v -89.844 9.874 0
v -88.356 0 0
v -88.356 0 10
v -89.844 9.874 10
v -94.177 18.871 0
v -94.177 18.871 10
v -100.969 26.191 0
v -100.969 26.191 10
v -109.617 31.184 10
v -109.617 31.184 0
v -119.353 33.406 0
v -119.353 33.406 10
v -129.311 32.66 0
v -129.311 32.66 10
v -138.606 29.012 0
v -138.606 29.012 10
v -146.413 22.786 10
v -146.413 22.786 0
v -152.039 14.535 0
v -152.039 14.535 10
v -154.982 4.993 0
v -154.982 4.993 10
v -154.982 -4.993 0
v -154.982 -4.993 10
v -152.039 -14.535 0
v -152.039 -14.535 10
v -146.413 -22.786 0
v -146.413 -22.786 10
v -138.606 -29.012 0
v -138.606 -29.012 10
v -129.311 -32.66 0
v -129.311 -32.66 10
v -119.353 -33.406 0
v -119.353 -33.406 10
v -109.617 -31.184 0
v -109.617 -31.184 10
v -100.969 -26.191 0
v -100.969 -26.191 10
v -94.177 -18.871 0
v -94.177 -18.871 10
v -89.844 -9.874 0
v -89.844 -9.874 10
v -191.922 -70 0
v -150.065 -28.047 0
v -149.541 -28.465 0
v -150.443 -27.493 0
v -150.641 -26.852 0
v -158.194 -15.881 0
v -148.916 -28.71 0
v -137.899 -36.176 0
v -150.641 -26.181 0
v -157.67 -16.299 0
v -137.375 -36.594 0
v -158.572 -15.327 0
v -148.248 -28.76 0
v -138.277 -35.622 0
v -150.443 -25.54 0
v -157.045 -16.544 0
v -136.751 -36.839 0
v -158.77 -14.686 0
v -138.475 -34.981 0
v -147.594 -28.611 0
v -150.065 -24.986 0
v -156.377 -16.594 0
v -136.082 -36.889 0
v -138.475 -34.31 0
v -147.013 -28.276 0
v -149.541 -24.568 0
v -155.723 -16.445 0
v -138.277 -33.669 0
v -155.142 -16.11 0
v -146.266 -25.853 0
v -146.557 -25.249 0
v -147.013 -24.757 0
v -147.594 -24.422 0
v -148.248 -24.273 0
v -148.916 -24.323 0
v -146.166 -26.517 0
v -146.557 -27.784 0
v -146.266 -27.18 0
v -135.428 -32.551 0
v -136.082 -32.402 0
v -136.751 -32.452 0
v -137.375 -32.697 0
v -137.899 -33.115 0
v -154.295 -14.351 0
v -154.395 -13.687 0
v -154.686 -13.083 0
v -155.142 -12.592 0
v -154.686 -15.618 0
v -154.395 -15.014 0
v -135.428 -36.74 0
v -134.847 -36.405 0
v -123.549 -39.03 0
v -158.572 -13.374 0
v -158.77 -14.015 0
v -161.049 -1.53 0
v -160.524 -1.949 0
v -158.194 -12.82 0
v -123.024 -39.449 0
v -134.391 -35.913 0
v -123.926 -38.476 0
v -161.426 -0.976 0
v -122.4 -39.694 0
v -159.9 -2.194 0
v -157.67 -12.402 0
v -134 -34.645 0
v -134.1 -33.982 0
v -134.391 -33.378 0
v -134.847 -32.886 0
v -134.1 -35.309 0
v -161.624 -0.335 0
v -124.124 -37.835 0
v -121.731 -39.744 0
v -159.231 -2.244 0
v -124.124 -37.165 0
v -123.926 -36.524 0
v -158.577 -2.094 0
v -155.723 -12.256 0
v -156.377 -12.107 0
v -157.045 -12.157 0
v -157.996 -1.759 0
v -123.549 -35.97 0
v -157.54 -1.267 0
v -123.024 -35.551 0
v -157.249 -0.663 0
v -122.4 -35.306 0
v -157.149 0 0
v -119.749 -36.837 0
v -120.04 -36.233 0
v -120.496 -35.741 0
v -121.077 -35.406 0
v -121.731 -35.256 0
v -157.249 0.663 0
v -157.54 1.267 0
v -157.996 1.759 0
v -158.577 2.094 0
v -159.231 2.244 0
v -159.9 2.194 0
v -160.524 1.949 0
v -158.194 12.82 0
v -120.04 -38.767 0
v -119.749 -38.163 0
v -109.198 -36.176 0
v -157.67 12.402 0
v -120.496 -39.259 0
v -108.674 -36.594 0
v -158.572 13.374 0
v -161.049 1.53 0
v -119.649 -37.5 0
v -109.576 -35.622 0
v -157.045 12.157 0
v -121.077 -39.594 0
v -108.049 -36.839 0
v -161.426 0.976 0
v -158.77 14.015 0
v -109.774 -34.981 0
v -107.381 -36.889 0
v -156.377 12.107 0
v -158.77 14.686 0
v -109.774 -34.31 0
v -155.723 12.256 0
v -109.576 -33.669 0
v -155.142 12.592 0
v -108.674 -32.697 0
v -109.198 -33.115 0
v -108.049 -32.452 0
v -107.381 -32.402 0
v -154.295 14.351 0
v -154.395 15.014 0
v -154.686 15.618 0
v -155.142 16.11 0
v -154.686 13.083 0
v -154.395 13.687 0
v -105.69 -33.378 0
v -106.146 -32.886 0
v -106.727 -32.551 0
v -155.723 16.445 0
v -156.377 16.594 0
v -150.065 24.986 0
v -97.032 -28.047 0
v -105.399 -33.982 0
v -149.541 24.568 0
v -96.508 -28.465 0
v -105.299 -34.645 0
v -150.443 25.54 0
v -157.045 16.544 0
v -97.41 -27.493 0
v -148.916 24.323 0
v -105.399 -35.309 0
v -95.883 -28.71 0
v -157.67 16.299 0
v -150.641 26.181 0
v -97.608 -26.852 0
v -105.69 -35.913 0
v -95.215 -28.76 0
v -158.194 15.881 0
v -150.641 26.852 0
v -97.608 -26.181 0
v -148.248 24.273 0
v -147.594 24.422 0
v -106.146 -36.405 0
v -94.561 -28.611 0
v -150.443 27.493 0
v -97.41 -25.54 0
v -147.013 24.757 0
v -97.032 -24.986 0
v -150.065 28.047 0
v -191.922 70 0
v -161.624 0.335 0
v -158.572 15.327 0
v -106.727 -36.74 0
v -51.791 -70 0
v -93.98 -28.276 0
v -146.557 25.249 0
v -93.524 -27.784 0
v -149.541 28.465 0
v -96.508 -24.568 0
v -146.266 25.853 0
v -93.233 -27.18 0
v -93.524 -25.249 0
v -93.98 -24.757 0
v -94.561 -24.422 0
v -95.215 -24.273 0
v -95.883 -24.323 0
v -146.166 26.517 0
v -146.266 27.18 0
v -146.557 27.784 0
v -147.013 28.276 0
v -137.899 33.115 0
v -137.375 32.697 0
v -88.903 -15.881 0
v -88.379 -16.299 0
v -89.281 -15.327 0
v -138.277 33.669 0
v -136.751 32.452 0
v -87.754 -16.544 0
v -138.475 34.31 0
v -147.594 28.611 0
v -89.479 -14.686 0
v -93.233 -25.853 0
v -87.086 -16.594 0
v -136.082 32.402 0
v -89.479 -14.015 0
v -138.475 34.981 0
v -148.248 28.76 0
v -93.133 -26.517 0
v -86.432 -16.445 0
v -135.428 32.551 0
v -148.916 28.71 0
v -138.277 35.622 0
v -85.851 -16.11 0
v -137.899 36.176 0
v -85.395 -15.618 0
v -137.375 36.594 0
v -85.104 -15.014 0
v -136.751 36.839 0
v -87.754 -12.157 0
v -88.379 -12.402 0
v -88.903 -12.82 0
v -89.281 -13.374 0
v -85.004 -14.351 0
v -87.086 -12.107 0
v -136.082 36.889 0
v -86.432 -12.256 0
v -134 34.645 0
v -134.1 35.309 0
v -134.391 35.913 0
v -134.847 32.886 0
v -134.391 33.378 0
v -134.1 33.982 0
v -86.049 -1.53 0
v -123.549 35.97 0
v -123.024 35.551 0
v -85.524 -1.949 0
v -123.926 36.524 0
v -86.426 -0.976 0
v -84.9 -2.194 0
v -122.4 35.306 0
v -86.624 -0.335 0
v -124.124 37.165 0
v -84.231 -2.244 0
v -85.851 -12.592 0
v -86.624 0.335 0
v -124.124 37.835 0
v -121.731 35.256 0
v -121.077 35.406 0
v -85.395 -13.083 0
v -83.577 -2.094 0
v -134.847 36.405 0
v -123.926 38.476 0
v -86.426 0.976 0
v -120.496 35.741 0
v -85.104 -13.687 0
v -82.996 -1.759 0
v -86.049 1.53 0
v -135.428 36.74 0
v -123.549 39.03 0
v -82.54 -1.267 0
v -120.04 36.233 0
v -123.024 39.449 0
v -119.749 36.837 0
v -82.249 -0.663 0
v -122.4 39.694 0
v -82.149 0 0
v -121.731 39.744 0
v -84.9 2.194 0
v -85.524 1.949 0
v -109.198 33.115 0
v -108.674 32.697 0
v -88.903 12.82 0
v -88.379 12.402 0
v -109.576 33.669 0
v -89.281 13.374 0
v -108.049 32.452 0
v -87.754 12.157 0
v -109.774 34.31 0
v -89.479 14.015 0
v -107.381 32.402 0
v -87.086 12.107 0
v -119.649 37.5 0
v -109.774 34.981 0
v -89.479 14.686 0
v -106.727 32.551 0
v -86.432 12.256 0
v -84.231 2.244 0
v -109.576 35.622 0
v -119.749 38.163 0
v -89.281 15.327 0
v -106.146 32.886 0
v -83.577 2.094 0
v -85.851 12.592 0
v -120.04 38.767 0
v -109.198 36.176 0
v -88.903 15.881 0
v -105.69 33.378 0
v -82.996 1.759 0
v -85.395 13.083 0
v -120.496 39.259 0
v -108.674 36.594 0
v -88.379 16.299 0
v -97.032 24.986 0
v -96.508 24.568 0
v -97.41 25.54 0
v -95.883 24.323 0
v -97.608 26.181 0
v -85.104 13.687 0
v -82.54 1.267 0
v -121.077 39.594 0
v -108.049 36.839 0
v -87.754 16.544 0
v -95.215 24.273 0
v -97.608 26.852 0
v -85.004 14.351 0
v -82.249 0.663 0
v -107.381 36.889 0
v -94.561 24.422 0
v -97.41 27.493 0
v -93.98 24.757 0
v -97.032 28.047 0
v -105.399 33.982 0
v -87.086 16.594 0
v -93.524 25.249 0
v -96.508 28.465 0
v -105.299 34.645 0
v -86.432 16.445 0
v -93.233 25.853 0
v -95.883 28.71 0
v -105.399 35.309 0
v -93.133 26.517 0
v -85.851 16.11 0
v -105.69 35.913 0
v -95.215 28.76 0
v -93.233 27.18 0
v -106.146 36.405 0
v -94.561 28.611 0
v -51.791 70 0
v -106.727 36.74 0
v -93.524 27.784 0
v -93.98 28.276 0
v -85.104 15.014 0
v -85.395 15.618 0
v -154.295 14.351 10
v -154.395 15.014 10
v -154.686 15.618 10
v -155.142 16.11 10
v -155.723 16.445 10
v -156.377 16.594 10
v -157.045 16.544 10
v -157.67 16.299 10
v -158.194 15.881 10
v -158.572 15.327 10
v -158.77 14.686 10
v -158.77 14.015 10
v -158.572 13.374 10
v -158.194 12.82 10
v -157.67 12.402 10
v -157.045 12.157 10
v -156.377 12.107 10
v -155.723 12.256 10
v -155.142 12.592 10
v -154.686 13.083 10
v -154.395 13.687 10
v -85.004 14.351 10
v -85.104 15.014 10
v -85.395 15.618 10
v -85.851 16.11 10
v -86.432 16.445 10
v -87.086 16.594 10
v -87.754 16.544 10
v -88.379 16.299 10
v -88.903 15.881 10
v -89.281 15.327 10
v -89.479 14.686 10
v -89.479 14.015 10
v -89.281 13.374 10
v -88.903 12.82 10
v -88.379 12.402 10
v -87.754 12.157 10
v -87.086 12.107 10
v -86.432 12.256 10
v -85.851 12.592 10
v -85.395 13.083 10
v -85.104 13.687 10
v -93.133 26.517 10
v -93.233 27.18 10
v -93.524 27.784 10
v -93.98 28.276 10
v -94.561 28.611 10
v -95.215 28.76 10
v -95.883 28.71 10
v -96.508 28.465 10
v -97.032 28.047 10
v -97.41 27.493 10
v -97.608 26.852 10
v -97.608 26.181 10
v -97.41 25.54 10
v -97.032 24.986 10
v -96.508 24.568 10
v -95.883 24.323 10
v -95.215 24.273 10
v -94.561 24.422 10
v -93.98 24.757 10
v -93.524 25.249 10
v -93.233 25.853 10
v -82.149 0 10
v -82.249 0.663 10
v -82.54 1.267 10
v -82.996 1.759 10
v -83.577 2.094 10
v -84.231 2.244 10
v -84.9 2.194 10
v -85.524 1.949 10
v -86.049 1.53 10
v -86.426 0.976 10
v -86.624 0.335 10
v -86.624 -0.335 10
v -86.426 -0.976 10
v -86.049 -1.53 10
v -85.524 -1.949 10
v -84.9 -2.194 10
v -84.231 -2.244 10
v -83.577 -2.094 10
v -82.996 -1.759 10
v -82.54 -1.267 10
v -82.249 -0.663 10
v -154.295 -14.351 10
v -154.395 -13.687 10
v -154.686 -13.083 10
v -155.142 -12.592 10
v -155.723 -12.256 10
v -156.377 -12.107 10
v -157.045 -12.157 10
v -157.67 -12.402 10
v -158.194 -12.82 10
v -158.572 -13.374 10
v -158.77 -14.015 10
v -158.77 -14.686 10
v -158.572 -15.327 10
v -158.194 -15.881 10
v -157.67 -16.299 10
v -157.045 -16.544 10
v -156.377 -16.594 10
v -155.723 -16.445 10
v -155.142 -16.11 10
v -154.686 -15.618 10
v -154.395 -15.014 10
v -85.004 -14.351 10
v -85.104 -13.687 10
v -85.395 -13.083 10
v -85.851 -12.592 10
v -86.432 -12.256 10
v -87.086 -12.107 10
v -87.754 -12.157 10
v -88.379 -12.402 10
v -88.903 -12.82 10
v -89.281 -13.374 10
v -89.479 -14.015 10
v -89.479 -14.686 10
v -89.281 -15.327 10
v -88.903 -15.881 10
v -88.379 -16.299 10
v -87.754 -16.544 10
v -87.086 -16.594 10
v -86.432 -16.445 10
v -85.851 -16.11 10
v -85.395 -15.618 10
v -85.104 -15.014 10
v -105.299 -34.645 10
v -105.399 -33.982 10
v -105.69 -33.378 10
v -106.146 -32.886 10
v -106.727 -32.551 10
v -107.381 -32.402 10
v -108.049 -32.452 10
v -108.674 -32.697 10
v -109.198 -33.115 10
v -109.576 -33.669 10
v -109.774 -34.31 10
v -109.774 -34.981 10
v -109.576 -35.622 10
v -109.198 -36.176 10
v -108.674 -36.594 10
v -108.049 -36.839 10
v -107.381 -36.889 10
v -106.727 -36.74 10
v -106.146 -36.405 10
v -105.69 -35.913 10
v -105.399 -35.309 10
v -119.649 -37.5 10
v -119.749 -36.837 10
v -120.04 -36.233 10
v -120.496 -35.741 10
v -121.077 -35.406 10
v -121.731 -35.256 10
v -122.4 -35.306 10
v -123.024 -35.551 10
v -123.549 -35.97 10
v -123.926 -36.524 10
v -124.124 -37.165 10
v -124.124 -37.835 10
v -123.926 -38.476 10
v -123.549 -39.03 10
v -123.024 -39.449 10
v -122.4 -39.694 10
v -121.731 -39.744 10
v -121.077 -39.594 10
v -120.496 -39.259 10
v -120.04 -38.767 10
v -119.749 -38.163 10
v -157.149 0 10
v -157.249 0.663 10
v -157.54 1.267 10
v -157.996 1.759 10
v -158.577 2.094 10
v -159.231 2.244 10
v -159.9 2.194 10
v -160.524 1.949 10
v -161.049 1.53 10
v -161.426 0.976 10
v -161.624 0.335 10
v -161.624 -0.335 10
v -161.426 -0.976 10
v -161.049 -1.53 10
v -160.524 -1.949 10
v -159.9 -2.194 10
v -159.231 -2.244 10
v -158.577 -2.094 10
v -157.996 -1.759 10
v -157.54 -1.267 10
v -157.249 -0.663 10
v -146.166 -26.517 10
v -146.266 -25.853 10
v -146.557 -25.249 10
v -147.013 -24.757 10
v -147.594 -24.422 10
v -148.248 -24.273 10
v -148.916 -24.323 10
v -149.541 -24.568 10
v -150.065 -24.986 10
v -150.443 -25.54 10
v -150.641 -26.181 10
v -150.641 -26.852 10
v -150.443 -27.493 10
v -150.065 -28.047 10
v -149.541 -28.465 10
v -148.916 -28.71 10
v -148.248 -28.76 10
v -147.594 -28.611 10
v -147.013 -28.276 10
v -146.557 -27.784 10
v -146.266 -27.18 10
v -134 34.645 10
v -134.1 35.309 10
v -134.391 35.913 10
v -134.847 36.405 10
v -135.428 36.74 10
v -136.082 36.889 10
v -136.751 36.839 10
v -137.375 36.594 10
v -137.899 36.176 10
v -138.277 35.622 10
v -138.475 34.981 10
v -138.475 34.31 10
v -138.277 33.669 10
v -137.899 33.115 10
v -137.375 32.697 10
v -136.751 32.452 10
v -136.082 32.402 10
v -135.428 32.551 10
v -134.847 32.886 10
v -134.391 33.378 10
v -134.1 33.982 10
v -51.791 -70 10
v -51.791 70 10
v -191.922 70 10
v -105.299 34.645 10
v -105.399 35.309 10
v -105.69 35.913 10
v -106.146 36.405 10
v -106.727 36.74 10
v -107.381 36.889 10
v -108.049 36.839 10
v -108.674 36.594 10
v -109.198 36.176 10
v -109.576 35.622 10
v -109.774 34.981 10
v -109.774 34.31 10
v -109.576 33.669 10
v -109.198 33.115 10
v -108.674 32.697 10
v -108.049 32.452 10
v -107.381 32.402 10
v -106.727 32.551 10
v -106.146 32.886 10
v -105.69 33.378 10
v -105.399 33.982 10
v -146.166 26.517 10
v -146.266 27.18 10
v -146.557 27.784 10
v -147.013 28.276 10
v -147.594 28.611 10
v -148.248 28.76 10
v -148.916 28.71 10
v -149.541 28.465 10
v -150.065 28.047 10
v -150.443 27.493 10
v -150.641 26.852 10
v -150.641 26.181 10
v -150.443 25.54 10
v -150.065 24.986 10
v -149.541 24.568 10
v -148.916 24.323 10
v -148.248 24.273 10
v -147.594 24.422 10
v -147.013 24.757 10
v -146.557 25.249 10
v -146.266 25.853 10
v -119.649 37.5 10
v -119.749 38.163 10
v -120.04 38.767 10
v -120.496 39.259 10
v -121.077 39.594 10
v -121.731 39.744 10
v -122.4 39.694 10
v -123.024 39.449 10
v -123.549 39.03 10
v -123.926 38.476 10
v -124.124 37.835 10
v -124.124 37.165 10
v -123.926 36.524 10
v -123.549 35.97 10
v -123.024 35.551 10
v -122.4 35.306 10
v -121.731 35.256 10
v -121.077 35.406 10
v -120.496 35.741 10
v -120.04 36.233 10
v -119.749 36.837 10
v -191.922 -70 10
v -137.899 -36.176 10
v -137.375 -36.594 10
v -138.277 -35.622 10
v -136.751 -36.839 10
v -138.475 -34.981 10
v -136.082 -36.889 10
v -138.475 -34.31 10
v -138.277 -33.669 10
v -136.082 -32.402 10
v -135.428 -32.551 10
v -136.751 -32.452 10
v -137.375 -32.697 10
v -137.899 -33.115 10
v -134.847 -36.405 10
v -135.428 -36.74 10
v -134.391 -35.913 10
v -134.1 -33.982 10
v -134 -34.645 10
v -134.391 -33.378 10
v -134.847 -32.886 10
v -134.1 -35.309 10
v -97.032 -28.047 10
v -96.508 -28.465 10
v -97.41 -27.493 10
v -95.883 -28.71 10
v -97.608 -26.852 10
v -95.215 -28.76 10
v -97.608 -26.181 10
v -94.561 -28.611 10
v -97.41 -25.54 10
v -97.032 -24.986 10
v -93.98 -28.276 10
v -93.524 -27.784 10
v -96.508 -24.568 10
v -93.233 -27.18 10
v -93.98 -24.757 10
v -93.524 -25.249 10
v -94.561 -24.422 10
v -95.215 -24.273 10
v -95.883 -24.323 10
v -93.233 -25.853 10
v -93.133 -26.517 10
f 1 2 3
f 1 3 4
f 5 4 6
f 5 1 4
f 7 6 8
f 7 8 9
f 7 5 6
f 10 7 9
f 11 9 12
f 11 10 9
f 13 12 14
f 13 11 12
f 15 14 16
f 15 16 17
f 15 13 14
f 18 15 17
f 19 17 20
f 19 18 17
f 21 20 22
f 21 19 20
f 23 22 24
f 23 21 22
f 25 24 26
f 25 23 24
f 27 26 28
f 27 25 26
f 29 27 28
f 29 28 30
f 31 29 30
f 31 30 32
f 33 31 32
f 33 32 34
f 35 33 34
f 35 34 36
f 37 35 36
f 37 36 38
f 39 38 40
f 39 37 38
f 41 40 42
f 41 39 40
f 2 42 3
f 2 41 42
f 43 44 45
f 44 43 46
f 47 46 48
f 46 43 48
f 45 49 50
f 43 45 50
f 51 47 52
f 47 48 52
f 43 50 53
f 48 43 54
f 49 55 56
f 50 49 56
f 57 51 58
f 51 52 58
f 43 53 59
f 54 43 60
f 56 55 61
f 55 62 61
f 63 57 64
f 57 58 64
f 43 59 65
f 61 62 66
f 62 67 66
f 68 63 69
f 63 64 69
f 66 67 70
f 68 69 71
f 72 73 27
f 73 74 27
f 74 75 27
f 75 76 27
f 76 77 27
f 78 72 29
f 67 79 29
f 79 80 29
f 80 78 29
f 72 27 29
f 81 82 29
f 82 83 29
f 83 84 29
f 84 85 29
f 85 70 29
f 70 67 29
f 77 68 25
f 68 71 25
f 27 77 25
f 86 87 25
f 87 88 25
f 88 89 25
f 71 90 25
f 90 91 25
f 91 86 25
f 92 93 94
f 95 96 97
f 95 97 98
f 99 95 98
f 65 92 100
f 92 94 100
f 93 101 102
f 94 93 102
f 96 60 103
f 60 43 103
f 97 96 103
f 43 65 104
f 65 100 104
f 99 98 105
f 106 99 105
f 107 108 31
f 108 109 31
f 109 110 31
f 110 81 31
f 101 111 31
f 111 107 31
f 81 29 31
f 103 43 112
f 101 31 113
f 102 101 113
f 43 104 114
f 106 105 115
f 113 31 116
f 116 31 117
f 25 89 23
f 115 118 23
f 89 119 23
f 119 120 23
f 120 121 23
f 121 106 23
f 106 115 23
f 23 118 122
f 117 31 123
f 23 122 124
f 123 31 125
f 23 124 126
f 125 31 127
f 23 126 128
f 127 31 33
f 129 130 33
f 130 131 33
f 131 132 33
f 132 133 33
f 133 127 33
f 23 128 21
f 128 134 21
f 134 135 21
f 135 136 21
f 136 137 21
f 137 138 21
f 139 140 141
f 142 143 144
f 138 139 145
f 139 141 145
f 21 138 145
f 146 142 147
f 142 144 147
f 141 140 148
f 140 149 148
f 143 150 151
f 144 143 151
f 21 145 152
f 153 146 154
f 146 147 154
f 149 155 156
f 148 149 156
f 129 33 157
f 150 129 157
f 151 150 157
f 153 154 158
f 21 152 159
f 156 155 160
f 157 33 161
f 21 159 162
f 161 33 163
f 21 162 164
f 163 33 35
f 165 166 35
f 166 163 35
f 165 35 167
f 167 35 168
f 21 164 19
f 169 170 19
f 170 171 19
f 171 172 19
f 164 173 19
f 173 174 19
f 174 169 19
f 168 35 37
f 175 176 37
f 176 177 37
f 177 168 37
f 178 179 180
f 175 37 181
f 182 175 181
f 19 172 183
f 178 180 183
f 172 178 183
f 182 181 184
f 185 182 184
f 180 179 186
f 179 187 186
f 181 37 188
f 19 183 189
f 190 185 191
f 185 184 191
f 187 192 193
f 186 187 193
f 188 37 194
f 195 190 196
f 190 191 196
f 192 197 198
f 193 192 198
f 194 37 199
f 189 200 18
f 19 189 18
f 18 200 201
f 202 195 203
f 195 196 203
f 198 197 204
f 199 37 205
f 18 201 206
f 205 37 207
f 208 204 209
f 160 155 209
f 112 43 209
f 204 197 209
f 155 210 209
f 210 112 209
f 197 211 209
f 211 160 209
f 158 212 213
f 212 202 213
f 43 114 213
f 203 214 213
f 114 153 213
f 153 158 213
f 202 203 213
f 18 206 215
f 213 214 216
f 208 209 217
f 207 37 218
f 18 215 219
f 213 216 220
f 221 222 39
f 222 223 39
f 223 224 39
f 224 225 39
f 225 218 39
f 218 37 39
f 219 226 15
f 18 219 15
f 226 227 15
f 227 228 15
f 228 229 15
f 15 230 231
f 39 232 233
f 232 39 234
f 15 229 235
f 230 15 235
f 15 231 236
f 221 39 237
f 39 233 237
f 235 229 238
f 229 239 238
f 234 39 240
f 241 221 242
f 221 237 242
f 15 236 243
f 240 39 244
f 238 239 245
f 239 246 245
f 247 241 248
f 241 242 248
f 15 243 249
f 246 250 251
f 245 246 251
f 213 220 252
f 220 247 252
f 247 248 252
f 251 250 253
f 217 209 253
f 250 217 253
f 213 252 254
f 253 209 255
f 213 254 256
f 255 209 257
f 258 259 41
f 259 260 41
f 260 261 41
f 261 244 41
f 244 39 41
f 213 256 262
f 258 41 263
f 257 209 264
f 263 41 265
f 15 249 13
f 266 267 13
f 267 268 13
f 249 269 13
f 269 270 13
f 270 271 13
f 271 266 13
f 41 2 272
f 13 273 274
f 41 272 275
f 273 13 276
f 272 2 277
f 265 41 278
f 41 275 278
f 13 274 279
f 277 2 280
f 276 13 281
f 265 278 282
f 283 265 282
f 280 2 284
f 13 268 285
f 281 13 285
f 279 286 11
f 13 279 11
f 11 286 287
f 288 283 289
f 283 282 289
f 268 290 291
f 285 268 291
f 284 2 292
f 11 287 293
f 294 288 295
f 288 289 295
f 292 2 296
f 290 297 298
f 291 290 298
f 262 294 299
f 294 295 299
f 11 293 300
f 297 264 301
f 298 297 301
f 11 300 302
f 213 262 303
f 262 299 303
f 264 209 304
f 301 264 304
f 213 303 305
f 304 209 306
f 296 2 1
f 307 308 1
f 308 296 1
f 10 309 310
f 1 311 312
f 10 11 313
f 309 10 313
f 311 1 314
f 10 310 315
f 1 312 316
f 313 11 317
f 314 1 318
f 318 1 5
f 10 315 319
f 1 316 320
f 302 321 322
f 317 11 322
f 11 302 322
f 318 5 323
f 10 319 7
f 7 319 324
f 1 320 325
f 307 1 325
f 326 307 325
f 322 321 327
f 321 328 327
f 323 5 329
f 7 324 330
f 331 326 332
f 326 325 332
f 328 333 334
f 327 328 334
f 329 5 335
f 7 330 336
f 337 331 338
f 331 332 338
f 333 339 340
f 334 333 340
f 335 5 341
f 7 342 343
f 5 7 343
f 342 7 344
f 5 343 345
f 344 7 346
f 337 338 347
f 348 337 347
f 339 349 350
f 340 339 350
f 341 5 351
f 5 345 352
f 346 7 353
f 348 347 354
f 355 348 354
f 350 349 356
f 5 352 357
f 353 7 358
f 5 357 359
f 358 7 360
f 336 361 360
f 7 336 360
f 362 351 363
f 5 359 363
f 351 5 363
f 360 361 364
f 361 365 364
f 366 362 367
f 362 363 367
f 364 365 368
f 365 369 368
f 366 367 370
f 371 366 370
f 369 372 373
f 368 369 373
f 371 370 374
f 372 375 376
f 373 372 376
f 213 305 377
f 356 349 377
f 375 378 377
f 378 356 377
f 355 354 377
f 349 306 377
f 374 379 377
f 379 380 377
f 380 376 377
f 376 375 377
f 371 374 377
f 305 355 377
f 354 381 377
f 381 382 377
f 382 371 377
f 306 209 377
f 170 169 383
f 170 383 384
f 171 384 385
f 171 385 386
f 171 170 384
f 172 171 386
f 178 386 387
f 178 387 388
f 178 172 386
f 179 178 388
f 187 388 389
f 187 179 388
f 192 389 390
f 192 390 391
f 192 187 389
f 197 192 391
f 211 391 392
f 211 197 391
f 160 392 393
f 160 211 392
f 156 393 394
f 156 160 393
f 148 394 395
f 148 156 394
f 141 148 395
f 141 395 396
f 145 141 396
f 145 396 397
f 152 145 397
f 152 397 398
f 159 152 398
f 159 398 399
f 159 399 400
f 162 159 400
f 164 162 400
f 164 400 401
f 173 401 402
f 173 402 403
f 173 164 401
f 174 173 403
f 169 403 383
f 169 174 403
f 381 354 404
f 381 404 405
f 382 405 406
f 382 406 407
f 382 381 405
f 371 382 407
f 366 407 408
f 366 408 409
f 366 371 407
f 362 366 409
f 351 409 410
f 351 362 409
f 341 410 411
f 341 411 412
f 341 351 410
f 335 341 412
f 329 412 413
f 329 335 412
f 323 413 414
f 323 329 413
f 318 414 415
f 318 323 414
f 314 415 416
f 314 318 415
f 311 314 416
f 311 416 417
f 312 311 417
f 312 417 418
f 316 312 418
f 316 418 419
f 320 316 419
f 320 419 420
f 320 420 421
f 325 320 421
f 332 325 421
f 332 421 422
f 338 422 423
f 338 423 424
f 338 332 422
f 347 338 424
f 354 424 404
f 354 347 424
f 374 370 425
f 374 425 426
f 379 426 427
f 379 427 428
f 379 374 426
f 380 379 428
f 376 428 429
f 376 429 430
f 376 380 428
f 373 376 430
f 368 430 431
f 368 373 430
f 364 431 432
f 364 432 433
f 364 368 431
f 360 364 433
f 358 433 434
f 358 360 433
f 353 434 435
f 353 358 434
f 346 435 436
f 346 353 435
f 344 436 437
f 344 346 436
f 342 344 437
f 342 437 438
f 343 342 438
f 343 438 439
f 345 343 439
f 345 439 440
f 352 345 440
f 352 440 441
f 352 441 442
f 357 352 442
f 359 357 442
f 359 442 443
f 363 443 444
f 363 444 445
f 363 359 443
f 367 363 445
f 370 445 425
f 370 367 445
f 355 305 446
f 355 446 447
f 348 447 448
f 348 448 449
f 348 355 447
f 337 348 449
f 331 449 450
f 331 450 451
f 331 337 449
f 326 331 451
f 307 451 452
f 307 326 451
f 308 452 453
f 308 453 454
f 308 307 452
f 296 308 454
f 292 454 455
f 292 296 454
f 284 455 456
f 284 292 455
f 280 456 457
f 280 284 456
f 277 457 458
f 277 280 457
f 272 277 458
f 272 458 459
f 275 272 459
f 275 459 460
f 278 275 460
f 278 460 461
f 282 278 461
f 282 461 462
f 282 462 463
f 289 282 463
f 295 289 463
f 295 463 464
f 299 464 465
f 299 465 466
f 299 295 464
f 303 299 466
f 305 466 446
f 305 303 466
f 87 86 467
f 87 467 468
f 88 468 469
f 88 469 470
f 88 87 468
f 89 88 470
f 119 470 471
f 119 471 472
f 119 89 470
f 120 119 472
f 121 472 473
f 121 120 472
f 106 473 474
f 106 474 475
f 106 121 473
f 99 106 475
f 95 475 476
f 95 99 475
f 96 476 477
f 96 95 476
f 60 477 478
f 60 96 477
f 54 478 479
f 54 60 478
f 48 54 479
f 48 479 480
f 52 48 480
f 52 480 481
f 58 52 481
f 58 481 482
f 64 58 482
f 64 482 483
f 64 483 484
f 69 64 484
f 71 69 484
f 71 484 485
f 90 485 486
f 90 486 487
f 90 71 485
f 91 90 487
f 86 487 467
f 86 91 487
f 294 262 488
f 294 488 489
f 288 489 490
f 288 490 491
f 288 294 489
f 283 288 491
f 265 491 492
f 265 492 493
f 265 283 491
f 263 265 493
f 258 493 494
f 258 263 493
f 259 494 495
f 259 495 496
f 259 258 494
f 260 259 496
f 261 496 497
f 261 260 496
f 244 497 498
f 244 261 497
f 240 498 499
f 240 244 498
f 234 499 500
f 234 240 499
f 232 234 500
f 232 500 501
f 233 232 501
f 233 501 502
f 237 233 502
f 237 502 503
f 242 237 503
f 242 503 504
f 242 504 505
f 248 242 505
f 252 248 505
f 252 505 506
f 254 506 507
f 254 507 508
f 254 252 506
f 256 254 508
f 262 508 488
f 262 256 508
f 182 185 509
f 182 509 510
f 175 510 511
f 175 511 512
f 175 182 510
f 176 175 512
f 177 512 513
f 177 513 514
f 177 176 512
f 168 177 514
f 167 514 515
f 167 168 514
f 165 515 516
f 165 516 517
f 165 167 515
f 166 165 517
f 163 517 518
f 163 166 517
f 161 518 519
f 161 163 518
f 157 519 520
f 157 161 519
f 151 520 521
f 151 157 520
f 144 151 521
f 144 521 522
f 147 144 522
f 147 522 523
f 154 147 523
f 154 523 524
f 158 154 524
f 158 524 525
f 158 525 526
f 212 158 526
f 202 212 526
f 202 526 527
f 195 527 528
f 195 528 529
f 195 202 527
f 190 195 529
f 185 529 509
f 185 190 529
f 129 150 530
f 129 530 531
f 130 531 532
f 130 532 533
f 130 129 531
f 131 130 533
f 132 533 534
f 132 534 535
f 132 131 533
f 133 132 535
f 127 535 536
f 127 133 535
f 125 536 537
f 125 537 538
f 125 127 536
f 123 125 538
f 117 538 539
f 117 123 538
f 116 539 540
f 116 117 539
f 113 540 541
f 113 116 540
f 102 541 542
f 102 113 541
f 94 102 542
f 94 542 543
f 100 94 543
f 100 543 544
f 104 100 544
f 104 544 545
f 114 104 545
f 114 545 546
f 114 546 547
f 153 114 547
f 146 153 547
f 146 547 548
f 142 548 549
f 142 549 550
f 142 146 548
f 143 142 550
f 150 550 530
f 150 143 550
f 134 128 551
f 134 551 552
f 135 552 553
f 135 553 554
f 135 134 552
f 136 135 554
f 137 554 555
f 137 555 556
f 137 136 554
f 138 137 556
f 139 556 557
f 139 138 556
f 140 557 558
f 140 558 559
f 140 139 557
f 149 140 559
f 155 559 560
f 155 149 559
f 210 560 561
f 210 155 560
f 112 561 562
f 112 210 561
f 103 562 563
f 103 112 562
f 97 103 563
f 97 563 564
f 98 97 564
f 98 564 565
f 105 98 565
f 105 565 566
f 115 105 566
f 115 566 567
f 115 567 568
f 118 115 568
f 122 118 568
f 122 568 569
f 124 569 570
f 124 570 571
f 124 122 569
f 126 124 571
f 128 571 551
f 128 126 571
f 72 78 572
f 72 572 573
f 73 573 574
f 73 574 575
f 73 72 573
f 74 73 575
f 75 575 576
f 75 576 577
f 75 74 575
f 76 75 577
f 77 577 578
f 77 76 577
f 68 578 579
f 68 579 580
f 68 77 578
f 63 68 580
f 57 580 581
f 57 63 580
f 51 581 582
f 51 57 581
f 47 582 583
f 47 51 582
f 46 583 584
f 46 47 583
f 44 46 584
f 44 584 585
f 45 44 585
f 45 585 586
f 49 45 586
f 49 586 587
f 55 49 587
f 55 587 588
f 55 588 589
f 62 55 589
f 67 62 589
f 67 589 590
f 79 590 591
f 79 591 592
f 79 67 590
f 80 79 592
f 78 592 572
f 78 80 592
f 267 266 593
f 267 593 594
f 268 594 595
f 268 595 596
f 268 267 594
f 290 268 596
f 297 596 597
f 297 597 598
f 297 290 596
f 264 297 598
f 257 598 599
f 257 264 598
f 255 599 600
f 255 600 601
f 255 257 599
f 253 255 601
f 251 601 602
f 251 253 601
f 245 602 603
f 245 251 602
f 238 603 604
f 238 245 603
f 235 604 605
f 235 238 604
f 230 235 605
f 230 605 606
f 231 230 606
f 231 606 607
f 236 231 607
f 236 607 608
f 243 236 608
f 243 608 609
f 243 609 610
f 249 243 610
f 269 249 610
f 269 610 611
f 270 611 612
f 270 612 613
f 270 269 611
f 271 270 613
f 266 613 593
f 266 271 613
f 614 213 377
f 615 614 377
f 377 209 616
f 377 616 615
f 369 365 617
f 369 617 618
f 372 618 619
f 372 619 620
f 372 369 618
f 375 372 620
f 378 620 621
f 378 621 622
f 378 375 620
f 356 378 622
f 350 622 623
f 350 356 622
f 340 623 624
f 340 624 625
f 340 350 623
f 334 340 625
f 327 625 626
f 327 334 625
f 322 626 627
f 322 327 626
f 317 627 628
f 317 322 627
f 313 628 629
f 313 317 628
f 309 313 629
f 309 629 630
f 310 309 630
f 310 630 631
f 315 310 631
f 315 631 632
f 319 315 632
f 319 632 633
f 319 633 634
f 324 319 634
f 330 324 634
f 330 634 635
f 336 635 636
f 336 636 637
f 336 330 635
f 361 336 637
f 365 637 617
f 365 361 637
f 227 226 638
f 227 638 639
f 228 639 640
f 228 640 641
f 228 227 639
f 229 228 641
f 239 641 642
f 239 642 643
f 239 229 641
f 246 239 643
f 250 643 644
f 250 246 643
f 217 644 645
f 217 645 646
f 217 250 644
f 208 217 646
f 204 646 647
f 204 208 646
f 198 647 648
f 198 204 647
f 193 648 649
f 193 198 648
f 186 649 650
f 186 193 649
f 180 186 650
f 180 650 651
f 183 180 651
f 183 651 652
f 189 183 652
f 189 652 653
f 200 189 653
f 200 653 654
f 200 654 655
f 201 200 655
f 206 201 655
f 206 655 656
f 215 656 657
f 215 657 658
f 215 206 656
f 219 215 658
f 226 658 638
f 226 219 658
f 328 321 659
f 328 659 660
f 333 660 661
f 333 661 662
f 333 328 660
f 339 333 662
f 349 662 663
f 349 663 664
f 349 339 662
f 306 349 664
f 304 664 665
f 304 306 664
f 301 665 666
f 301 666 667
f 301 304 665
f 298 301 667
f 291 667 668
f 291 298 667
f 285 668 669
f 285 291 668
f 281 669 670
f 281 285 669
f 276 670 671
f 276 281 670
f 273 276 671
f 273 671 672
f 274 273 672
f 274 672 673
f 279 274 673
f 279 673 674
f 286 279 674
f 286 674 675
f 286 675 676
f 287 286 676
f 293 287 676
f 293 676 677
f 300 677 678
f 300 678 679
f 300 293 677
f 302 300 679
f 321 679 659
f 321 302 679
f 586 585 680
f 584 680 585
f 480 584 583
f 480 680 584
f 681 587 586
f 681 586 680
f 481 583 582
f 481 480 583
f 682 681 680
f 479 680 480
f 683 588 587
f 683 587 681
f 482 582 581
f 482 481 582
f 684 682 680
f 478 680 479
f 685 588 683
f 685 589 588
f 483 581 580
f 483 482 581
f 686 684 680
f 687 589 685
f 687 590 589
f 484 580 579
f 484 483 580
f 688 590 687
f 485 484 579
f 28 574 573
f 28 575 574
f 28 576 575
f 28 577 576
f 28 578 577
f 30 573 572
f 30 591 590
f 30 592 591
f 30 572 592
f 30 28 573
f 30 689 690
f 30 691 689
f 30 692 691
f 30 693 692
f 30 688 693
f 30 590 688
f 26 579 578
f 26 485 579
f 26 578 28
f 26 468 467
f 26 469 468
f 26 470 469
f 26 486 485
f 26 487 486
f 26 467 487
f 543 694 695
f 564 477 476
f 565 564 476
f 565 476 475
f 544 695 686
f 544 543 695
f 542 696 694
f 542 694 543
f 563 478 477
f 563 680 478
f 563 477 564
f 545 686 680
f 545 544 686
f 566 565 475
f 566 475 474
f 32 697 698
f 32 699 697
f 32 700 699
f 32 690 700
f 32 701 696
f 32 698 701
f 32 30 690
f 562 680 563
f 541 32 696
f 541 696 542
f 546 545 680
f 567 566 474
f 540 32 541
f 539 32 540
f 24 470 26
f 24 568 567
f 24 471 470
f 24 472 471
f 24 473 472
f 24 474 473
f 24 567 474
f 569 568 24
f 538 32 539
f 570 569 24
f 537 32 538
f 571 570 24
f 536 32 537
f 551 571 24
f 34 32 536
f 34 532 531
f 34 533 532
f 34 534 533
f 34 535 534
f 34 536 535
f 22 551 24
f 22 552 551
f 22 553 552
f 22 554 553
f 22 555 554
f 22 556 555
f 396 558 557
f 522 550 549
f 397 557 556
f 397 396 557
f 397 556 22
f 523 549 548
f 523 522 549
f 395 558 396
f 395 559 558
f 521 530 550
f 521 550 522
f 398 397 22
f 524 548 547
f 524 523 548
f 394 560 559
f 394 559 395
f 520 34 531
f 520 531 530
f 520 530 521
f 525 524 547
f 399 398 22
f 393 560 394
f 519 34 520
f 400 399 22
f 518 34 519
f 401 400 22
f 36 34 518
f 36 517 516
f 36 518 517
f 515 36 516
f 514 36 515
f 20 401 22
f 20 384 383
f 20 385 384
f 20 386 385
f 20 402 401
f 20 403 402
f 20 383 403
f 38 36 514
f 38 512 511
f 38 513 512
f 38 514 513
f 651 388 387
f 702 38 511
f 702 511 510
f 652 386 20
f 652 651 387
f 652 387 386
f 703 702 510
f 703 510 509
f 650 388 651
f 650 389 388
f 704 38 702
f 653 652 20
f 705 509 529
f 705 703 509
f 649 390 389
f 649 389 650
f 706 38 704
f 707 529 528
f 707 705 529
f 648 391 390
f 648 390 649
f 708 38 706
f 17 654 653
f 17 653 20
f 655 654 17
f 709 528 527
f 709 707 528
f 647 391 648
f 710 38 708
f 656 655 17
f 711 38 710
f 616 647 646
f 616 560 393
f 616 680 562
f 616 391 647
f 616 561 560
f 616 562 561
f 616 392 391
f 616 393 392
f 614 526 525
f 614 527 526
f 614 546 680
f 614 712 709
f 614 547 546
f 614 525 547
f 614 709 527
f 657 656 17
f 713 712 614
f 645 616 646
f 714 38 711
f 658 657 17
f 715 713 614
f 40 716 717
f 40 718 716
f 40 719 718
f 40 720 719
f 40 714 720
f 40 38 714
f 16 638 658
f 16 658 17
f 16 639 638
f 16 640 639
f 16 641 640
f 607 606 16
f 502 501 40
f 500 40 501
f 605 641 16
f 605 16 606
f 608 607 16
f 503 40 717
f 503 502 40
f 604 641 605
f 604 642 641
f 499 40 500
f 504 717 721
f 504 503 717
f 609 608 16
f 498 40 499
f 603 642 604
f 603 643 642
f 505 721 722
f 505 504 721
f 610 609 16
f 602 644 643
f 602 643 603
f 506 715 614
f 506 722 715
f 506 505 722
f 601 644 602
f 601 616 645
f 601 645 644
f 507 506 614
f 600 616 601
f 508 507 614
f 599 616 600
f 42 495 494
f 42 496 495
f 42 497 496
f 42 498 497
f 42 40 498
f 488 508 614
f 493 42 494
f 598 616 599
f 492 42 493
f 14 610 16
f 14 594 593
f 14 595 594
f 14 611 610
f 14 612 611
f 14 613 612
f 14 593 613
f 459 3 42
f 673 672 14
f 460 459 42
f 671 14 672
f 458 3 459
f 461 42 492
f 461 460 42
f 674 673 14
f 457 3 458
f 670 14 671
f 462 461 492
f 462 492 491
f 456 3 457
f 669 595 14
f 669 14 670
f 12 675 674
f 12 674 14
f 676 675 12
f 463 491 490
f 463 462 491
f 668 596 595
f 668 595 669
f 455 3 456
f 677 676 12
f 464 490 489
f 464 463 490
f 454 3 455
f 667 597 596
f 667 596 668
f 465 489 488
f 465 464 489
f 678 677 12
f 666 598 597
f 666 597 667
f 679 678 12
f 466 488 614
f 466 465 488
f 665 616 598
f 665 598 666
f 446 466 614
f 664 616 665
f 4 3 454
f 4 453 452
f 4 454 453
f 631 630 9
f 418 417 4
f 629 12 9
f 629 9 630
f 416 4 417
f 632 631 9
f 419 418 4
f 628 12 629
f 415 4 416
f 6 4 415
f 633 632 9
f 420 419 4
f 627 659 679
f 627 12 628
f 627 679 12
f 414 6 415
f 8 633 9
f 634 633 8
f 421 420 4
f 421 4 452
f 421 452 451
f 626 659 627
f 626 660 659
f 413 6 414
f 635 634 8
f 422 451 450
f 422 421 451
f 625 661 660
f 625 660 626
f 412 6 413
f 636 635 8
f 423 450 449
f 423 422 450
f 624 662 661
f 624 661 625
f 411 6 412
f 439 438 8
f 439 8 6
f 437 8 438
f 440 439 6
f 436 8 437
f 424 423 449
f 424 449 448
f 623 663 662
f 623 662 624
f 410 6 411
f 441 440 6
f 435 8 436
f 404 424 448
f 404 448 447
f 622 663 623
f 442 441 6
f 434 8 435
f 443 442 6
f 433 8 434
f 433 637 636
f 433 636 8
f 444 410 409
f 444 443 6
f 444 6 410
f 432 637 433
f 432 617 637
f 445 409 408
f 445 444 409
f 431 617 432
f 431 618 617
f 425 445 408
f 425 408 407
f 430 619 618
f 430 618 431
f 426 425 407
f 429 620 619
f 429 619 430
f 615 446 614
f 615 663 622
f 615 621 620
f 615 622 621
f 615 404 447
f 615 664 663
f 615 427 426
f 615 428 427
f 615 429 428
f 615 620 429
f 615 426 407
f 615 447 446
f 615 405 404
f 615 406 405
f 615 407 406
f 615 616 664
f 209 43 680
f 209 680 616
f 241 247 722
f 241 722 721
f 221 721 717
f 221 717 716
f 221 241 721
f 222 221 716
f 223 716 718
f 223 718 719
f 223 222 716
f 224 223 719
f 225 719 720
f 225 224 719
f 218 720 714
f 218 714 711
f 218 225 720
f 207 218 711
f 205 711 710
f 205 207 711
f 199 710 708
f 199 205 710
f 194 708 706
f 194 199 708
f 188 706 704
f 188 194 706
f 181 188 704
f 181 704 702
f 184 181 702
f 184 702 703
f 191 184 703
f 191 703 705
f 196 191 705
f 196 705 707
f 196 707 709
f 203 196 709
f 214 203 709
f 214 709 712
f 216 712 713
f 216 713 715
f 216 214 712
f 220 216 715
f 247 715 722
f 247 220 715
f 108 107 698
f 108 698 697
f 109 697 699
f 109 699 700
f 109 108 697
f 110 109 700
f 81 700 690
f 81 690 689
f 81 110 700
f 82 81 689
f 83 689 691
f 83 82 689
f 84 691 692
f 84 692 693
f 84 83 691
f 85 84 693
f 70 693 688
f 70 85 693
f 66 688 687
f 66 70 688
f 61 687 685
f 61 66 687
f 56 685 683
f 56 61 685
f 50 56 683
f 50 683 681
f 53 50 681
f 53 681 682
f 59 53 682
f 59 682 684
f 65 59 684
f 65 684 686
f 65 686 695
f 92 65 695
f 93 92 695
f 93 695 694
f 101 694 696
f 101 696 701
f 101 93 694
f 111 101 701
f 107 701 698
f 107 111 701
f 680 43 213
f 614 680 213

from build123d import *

# Parameters (mm, degrees)
SKETCH3_W             = 140.131000148
SKETCH3_H             = 140
BOSS_EXTRUDE3_DEPTH   = 10
SKETCH3_7_OUTSIDE_W   = 181.797
SKETCH3_7_OUTSIDE_H   = 181.666
SKETCH3_7_OUTSIDE_W_2 = 140.131000148
SKETCH3_7_OUTSIDE_H_2 = 140
SKETCH3_7_OUTSIDE_R   = 33.499999497
CUT_EXTRUDE5_DEPTH    = 10
SKETCH2_R             = 2.25
CUT_EXTRUDE6_DEPTH    = 10


with BuildPart() as part:
    # Sketch3 → Boss-Extrude3 (new body)
    with BuildSketch(Plane.XY):
        with Locations((-121.856065437, 0)):
            Rectangle(SKETCH3_W, SKETCH3_H)
    extrude(amount=BOSS_EXTRUDE3_DEPTH)

    # Sketch3<7> outside → Cut-Extrude5 (cut)
    # profile 1 of 2: a face of its own
    with BuildSketch(Plane.XY):
        with Locations((-121.8565, 0)):
            Rectangle(SKETCH3_7_OUTSIDE_W, SKETCH3_7_OUTSIDE_H)
        with Locations((-121.856065437, 0)):
            Rectangle(SKETCH3_7_OUTSIDE_W_2, SKETCH3_7_OUTSIDE_H_2, mode=Mode.SUBTRACT)
    # profile 2 of 2: a face of its own
    with BuildSketch(Plane.XY):
        with Locations((-121.856065437, 0)):
            Circle(SKETCH3_7_OUTSIDE_R)
    extrude(amount=CUT_EXTRUDE5_DEPTH, mode=Mode.SUBTRACT)

    # Sketch2 → Cut-Extrude6 (cut)
    with BuildSketch(Plane.XY):
        with Locations((-107.548664291, 34.645482469)):
            Circle(SKETCH2_R)
        with Locations((-95.38278871, 26.516504294)):
            Circle(SKETCH2_R)
        with Locations((-87.253810535, 14.350628714)):
            Circle(SKETCH2_R)
        with Locations((-84.399293004, 0)):
            Circle(SKETCH2_R)
        with Locations((-87.253810535, -14.350628714)):
            Circle(SKETCH2_R)
        with Locations((-95.38278871, -26.516504294)):
            Circle(SKETCH2_R)
        with Locations((-107.548664291, -34.645482469)):
            Circle(SKETCH2_R)
        with Locations((-121.899293004, -37.5)):
            Circle(SKETCH2_R)
        with Locations((-136.249921718, -34.645482469)):
            Circle(SKETCH2_R)
        with Locations((-148.415797299, -26.516504294)):
            Circle(SKETCH2_R)
        with Locations((-156.544775474, -14.350628714)):
            Circle(SKETCH2_R)
        with Locations((-159.399293004, 0)):
            Circle(SKETCH2_R)
        with Locations((-156.544775474, 14.350628714)):
            Circle(SKETCH2_R)
        with Locations((-148.415797299, 26.516504294)):
            Circle(SKETCH2_R)
        with Locations((-136.249921718, 34.645482469)):
            Circle(SKETCH2_R)
        with Locations((-121.899293004, 37.5)):
            Circle(SKETCH2_R)
    extrude(amount=CUT_EXTRUDE6_DEPTH, mode=Mode.SUBTRACT)


solid = part.part
